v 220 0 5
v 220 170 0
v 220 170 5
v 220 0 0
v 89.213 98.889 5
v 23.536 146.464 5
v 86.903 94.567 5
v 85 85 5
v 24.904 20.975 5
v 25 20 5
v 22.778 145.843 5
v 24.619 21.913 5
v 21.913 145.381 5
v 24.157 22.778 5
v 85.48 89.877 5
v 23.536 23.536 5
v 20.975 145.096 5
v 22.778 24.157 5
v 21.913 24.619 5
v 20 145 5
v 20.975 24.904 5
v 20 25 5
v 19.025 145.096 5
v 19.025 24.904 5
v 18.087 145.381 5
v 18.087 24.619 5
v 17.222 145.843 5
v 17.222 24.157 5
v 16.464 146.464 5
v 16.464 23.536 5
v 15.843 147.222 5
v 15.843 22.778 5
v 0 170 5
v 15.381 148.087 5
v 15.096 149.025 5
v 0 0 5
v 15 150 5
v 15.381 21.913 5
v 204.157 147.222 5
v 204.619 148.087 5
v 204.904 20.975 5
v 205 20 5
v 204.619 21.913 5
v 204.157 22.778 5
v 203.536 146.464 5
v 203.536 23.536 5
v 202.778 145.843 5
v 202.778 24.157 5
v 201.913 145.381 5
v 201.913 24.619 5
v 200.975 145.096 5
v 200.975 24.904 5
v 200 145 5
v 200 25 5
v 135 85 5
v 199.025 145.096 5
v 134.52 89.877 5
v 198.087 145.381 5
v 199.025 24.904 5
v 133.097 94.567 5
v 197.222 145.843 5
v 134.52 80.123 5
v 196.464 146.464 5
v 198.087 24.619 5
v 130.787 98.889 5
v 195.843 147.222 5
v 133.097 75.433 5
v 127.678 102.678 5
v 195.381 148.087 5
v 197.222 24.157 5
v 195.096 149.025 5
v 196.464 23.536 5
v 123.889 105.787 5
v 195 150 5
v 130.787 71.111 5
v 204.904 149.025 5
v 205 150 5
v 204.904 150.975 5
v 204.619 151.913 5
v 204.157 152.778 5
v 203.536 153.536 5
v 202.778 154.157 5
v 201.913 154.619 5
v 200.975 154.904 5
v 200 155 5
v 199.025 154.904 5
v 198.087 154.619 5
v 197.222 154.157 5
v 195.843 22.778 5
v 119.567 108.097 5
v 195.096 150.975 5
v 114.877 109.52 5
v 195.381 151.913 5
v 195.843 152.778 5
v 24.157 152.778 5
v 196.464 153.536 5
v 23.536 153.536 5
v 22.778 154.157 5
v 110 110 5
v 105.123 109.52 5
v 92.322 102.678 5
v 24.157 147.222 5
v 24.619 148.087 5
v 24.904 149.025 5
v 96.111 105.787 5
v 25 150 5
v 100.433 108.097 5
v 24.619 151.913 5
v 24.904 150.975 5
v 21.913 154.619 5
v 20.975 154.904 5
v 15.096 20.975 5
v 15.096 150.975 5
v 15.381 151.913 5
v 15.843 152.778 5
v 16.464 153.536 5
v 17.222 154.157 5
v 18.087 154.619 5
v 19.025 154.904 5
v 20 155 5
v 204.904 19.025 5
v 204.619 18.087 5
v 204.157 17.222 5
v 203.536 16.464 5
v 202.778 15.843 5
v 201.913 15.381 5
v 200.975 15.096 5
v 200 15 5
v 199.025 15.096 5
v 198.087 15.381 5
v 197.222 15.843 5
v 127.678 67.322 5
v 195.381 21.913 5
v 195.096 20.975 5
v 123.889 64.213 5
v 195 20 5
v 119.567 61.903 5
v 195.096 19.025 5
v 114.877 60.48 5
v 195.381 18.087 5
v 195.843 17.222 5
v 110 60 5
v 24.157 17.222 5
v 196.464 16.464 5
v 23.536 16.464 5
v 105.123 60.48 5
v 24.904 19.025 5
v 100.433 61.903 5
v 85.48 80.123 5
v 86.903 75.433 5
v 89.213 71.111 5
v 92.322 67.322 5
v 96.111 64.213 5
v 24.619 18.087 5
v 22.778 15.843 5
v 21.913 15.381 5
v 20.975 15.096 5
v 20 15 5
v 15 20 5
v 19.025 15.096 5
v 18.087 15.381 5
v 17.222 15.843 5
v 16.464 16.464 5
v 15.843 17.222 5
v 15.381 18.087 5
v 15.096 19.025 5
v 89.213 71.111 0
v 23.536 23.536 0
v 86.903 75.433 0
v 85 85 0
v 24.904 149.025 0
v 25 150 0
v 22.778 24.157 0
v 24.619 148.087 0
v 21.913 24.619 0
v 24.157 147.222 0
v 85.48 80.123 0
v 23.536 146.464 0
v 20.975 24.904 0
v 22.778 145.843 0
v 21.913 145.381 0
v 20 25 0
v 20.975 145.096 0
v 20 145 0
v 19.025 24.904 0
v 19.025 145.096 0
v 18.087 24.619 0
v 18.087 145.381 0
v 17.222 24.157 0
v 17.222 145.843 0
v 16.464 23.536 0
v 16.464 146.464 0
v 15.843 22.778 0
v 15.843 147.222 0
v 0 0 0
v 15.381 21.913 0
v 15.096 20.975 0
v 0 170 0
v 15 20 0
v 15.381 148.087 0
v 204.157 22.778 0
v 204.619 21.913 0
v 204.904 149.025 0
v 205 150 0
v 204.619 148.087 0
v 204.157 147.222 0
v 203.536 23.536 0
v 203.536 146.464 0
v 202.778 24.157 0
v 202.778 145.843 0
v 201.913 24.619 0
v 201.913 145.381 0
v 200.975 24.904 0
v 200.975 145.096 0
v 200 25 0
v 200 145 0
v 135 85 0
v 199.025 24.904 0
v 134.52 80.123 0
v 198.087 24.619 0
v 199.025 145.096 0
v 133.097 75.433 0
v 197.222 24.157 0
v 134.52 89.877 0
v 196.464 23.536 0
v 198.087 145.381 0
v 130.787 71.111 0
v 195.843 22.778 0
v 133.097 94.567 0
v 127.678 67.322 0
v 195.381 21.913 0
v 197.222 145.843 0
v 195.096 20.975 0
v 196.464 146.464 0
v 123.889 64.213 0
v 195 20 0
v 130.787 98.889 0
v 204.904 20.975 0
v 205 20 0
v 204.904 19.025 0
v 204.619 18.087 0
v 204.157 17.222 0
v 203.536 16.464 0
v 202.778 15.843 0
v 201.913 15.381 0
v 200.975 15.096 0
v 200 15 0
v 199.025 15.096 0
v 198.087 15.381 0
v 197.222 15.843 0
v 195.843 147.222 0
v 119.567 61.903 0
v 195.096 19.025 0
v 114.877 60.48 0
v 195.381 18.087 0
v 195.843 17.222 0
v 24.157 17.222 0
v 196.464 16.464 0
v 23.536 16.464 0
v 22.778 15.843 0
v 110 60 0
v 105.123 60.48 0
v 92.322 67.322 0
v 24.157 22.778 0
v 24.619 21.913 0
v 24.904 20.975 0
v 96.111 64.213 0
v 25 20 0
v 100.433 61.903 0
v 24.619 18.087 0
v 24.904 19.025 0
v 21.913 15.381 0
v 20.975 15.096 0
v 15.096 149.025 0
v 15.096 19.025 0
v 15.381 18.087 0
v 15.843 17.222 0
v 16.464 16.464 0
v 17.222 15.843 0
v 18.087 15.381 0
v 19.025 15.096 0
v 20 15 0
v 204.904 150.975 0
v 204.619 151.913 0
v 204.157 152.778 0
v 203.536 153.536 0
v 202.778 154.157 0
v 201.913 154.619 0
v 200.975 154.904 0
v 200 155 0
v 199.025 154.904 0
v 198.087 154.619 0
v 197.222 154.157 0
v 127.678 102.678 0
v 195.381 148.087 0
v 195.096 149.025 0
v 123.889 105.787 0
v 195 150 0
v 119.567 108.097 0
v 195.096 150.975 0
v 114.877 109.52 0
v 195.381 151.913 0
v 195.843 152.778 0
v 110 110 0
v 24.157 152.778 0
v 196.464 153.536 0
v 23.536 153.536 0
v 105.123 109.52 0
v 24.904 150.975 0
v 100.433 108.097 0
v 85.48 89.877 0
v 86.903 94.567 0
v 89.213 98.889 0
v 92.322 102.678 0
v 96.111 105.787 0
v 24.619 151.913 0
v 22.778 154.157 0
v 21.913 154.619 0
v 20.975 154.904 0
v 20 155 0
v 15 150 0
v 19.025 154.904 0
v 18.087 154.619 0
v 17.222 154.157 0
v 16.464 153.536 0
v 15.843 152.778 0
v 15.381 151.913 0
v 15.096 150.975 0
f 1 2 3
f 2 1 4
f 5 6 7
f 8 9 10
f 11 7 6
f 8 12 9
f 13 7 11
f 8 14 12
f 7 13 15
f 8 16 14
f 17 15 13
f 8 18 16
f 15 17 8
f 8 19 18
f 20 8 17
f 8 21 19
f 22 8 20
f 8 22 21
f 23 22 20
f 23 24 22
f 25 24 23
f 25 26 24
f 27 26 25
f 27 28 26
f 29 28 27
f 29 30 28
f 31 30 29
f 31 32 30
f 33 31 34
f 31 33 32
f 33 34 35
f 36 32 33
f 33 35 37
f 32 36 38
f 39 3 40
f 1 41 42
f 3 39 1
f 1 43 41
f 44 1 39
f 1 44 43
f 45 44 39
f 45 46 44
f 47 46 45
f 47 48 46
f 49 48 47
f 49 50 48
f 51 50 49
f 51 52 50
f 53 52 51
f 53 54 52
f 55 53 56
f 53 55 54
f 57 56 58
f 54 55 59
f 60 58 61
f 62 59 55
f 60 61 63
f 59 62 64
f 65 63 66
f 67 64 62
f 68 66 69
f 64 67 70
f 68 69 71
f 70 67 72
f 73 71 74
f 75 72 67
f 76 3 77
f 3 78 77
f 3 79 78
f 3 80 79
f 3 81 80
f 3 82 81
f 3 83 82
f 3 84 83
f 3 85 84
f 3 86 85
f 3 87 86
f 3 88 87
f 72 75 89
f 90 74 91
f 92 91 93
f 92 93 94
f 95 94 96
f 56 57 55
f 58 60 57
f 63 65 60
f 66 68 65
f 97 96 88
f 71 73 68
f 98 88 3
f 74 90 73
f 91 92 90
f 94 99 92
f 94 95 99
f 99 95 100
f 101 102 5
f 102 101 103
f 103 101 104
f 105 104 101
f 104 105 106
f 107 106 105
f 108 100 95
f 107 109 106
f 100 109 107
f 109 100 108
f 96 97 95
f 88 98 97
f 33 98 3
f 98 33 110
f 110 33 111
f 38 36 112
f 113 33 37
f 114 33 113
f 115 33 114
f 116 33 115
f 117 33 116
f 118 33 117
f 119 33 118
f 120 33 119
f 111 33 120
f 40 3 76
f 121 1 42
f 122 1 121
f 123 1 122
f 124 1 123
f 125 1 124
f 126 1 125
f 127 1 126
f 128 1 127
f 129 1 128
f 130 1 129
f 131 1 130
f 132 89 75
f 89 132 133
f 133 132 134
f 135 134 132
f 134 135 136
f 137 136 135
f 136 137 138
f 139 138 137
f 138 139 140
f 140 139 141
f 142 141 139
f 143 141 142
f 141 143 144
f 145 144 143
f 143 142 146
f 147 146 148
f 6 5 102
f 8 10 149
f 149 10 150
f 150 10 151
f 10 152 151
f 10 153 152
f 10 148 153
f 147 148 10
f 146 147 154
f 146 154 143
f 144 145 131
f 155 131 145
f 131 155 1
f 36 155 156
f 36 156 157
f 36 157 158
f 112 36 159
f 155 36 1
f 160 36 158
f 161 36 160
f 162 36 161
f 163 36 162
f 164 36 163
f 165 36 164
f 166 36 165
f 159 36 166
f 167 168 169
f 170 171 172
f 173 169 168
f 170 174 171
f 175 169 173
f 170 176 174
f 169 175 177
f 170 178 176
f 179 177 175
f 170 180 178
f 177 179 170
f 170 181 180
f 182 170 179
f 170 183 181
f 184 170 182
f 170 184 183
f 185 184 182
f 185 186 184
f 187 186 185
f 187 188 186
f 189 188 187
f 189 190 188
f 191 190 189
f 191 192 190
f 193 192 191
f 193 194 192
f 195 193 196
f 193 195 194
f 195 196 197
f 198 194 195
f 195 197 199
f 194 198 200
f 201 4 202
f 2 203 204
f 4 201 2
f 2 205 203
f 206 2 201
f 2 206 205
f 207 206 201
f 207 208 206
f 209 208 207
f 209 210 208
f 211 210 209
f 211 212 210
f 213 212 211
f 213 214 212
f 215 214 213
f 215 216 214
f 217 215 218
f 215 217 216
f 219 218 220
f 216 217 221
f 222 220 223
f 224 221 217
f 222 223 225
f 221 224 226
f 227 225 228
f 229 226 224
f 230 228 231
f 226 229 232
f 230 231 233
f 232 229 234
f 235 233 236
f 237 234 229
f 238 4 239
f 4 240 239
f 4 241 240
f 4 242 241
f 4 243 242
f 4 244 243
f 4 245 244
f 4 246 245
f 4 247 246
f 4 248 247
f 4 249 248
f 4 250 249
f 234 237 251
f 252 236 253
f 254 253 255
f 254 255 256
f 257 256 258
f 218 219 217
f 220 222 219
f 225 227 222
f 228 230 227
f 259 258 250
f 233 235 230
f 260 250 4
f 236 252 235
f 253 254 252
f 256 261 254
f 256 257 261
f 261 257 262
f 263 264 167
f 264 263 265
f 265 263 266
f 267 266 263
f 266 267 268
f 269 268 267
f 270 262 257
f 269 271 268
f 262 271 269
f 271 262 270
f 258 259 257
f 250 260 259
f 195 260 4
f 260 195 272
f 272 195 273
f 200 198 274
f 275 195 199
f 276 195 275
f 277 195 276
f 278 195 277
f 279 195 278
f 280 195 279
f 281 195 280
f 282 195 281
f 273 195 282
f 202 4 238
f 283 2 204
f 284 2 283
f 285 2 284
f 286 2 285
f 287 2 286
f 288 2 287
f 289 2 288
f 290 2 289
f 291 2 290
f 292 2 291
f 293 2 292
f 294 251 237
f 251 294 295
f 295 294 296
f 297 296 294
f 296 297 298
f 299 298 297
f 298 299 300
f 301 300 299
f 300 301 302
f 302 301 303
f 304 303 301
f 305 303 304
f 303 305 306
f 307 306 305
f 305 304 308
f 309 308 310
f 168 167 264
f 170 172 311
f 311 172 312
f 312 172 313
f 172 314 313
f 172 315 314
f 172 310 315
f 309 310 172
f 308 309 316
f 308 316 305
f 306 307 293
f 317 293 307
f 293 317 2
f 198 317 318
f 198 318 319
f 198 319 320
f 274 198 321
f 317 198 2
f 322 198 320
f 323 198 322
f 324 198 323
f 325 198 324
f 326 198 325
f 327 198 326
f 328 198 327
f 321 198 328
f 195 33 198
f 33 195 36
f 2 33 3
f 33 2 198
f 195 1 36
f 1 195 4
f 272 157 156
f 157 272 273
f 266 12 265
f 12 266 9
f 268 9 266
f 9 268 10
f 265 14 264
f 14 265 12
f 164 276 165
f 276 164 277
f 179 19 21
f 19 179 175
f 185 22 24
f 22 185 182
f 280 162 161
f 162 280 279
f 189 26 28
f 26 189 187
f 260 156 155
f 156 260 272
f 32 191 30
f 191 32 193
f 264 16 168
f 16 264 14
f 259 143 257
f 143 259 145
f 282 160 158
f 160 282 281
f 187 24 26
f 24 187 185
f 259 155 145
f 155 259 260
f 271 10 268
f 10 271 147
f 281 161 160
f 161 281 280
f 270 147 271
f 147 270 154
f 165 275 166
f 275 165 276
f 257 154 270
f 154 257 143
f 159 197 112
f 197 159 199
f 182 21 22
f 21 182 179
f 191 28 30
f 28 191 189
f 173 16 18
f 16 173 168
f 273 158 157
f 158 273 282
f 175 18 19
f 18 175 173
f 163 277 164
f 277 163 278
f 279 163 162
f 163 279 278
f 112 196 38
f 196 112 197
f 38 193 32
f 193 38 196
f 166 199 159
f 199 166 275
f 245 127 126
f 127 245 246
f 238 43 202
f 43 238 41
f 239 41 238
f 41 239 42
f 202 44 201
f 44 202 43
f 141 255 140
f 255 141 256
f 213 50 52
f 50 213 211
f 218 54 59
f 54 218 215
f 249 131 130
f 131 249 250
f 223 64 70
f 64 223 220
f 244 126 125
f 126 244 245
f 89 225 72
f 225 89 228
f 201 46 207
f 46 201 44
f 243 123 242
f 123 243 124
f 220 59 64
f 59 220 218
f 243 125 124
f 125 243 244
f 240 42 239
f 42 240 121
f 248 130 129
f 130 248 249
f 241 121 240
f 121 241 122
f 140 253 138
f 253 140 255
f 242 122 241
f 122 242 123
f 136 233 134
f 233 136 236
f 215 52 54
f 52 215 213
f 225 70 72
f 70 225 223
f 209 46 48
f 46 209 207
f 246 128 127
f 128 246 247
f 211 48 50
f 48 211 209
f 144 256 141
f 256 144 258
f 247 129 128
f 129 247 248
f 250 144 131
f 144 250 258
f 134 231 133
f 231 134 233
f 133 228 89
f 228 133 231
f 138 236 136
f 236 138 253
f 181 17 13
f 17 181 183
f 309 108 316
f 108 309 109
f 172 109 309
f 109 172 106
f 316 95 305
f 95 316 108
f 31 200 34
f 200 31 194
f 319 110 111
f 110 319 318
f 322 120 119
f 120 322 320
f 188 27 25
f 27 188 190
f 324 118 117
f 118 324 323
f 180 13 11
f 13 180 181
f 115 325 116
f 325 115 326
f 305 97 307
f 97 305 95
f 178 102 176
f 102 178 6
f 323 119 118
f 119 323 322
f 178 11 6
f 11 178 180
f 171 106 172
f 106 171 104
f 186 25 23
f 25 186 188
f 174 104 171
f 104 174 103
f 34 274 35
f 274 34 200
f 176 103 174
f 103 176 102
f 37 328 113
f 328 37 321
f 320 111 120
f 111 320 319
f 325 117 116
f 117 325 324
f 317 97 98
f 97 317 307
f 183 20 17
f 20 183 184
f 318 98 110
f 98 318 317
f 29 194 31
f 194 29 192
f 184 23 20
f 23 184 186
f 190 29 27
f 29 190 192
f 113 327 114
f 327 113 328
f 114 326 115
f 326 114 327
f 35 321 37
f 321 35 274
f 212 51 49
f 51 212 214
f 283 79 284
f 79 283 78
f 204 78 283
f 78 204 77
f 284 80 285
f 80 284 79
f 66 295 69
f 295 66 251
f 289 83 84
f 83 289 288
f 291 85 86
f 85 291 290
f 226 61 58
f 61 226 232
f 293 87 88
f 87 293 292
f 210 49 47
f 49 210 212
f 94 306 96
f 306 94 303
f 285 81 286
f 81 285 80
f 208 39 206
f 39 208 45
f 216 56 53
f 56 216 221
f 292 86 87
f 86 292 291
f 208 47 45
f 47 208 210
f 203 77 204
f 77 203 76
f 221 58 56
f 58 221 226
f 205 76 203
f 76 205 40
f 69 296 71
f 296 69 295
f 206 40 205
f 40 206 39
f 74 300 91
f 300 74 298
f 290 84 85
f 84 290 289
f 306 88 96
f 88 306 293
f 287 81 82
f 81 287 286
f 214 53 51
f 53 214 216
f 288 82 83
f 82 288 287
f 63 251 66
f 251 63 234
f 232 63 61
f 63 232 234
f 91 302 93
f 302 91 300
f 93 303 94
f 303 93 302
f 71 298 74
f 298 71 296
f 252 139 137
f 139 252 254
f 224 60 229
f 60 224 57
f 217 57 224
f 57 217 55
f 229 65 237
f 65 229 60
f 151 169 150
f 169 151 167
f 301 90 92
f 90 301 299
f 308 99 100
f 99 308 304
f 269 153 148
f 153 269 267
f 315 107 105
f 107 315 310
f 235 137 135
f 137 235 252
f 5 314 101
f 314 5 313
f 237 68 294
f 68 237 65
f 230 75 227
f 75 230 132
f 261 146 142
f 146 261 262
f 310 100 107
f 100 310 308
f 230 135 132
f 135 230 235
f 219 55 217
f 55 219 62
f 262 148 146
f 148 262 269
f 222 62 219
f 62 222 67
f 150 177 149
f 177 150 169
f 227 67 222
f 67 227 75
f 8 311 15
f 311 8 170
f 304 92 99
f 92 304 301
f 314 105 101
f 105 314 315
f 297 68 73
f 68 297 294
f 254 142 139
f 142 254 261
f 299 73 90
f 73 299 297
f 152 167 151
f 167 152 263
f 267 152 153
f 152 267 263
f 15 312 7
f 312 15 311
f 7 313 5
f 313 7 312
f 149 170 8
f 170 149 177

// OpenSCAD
$fn = 32;

// ----------------------------------------------------------------------
// Big plate: 200-250 mm adapter plate
// ----------------------------------------------------------------------

// --- parameters (mm) ---
plate_l = 220;            // plate length, X
plate_w = 170;            // plate width, Y
plate_t = 5;              // plate thickness, Z
corner_d = 10;            // corner hole diameter
corner_in = 20;           // corner hole inset from the edges
bore_d = 50;              // central bore

difference() {
  cube([plate_l, plate_w, plate_t]);
  translate([corner_in, corner_in, -1]) cylinder(h = plate_t + 2, d = corner_d);
  translate([plate_l - corner_in, corner_in, -1]) cylinder(h = plate_t + 2, d = corner_d);
  translate([corner_in, plate_w - corner_in, -1]) cylinder(h = plate_t + 2, d = corner_d);
  translate([plate_l - corner_in, plate_w - corner_in, -1]) cylinder(h = plate_t + 2, d = corner_d);
  translate([plate_l / 2, plate_w / 2, -1]) cylinder(h = plate_t + 2, d = bore_d);
}
